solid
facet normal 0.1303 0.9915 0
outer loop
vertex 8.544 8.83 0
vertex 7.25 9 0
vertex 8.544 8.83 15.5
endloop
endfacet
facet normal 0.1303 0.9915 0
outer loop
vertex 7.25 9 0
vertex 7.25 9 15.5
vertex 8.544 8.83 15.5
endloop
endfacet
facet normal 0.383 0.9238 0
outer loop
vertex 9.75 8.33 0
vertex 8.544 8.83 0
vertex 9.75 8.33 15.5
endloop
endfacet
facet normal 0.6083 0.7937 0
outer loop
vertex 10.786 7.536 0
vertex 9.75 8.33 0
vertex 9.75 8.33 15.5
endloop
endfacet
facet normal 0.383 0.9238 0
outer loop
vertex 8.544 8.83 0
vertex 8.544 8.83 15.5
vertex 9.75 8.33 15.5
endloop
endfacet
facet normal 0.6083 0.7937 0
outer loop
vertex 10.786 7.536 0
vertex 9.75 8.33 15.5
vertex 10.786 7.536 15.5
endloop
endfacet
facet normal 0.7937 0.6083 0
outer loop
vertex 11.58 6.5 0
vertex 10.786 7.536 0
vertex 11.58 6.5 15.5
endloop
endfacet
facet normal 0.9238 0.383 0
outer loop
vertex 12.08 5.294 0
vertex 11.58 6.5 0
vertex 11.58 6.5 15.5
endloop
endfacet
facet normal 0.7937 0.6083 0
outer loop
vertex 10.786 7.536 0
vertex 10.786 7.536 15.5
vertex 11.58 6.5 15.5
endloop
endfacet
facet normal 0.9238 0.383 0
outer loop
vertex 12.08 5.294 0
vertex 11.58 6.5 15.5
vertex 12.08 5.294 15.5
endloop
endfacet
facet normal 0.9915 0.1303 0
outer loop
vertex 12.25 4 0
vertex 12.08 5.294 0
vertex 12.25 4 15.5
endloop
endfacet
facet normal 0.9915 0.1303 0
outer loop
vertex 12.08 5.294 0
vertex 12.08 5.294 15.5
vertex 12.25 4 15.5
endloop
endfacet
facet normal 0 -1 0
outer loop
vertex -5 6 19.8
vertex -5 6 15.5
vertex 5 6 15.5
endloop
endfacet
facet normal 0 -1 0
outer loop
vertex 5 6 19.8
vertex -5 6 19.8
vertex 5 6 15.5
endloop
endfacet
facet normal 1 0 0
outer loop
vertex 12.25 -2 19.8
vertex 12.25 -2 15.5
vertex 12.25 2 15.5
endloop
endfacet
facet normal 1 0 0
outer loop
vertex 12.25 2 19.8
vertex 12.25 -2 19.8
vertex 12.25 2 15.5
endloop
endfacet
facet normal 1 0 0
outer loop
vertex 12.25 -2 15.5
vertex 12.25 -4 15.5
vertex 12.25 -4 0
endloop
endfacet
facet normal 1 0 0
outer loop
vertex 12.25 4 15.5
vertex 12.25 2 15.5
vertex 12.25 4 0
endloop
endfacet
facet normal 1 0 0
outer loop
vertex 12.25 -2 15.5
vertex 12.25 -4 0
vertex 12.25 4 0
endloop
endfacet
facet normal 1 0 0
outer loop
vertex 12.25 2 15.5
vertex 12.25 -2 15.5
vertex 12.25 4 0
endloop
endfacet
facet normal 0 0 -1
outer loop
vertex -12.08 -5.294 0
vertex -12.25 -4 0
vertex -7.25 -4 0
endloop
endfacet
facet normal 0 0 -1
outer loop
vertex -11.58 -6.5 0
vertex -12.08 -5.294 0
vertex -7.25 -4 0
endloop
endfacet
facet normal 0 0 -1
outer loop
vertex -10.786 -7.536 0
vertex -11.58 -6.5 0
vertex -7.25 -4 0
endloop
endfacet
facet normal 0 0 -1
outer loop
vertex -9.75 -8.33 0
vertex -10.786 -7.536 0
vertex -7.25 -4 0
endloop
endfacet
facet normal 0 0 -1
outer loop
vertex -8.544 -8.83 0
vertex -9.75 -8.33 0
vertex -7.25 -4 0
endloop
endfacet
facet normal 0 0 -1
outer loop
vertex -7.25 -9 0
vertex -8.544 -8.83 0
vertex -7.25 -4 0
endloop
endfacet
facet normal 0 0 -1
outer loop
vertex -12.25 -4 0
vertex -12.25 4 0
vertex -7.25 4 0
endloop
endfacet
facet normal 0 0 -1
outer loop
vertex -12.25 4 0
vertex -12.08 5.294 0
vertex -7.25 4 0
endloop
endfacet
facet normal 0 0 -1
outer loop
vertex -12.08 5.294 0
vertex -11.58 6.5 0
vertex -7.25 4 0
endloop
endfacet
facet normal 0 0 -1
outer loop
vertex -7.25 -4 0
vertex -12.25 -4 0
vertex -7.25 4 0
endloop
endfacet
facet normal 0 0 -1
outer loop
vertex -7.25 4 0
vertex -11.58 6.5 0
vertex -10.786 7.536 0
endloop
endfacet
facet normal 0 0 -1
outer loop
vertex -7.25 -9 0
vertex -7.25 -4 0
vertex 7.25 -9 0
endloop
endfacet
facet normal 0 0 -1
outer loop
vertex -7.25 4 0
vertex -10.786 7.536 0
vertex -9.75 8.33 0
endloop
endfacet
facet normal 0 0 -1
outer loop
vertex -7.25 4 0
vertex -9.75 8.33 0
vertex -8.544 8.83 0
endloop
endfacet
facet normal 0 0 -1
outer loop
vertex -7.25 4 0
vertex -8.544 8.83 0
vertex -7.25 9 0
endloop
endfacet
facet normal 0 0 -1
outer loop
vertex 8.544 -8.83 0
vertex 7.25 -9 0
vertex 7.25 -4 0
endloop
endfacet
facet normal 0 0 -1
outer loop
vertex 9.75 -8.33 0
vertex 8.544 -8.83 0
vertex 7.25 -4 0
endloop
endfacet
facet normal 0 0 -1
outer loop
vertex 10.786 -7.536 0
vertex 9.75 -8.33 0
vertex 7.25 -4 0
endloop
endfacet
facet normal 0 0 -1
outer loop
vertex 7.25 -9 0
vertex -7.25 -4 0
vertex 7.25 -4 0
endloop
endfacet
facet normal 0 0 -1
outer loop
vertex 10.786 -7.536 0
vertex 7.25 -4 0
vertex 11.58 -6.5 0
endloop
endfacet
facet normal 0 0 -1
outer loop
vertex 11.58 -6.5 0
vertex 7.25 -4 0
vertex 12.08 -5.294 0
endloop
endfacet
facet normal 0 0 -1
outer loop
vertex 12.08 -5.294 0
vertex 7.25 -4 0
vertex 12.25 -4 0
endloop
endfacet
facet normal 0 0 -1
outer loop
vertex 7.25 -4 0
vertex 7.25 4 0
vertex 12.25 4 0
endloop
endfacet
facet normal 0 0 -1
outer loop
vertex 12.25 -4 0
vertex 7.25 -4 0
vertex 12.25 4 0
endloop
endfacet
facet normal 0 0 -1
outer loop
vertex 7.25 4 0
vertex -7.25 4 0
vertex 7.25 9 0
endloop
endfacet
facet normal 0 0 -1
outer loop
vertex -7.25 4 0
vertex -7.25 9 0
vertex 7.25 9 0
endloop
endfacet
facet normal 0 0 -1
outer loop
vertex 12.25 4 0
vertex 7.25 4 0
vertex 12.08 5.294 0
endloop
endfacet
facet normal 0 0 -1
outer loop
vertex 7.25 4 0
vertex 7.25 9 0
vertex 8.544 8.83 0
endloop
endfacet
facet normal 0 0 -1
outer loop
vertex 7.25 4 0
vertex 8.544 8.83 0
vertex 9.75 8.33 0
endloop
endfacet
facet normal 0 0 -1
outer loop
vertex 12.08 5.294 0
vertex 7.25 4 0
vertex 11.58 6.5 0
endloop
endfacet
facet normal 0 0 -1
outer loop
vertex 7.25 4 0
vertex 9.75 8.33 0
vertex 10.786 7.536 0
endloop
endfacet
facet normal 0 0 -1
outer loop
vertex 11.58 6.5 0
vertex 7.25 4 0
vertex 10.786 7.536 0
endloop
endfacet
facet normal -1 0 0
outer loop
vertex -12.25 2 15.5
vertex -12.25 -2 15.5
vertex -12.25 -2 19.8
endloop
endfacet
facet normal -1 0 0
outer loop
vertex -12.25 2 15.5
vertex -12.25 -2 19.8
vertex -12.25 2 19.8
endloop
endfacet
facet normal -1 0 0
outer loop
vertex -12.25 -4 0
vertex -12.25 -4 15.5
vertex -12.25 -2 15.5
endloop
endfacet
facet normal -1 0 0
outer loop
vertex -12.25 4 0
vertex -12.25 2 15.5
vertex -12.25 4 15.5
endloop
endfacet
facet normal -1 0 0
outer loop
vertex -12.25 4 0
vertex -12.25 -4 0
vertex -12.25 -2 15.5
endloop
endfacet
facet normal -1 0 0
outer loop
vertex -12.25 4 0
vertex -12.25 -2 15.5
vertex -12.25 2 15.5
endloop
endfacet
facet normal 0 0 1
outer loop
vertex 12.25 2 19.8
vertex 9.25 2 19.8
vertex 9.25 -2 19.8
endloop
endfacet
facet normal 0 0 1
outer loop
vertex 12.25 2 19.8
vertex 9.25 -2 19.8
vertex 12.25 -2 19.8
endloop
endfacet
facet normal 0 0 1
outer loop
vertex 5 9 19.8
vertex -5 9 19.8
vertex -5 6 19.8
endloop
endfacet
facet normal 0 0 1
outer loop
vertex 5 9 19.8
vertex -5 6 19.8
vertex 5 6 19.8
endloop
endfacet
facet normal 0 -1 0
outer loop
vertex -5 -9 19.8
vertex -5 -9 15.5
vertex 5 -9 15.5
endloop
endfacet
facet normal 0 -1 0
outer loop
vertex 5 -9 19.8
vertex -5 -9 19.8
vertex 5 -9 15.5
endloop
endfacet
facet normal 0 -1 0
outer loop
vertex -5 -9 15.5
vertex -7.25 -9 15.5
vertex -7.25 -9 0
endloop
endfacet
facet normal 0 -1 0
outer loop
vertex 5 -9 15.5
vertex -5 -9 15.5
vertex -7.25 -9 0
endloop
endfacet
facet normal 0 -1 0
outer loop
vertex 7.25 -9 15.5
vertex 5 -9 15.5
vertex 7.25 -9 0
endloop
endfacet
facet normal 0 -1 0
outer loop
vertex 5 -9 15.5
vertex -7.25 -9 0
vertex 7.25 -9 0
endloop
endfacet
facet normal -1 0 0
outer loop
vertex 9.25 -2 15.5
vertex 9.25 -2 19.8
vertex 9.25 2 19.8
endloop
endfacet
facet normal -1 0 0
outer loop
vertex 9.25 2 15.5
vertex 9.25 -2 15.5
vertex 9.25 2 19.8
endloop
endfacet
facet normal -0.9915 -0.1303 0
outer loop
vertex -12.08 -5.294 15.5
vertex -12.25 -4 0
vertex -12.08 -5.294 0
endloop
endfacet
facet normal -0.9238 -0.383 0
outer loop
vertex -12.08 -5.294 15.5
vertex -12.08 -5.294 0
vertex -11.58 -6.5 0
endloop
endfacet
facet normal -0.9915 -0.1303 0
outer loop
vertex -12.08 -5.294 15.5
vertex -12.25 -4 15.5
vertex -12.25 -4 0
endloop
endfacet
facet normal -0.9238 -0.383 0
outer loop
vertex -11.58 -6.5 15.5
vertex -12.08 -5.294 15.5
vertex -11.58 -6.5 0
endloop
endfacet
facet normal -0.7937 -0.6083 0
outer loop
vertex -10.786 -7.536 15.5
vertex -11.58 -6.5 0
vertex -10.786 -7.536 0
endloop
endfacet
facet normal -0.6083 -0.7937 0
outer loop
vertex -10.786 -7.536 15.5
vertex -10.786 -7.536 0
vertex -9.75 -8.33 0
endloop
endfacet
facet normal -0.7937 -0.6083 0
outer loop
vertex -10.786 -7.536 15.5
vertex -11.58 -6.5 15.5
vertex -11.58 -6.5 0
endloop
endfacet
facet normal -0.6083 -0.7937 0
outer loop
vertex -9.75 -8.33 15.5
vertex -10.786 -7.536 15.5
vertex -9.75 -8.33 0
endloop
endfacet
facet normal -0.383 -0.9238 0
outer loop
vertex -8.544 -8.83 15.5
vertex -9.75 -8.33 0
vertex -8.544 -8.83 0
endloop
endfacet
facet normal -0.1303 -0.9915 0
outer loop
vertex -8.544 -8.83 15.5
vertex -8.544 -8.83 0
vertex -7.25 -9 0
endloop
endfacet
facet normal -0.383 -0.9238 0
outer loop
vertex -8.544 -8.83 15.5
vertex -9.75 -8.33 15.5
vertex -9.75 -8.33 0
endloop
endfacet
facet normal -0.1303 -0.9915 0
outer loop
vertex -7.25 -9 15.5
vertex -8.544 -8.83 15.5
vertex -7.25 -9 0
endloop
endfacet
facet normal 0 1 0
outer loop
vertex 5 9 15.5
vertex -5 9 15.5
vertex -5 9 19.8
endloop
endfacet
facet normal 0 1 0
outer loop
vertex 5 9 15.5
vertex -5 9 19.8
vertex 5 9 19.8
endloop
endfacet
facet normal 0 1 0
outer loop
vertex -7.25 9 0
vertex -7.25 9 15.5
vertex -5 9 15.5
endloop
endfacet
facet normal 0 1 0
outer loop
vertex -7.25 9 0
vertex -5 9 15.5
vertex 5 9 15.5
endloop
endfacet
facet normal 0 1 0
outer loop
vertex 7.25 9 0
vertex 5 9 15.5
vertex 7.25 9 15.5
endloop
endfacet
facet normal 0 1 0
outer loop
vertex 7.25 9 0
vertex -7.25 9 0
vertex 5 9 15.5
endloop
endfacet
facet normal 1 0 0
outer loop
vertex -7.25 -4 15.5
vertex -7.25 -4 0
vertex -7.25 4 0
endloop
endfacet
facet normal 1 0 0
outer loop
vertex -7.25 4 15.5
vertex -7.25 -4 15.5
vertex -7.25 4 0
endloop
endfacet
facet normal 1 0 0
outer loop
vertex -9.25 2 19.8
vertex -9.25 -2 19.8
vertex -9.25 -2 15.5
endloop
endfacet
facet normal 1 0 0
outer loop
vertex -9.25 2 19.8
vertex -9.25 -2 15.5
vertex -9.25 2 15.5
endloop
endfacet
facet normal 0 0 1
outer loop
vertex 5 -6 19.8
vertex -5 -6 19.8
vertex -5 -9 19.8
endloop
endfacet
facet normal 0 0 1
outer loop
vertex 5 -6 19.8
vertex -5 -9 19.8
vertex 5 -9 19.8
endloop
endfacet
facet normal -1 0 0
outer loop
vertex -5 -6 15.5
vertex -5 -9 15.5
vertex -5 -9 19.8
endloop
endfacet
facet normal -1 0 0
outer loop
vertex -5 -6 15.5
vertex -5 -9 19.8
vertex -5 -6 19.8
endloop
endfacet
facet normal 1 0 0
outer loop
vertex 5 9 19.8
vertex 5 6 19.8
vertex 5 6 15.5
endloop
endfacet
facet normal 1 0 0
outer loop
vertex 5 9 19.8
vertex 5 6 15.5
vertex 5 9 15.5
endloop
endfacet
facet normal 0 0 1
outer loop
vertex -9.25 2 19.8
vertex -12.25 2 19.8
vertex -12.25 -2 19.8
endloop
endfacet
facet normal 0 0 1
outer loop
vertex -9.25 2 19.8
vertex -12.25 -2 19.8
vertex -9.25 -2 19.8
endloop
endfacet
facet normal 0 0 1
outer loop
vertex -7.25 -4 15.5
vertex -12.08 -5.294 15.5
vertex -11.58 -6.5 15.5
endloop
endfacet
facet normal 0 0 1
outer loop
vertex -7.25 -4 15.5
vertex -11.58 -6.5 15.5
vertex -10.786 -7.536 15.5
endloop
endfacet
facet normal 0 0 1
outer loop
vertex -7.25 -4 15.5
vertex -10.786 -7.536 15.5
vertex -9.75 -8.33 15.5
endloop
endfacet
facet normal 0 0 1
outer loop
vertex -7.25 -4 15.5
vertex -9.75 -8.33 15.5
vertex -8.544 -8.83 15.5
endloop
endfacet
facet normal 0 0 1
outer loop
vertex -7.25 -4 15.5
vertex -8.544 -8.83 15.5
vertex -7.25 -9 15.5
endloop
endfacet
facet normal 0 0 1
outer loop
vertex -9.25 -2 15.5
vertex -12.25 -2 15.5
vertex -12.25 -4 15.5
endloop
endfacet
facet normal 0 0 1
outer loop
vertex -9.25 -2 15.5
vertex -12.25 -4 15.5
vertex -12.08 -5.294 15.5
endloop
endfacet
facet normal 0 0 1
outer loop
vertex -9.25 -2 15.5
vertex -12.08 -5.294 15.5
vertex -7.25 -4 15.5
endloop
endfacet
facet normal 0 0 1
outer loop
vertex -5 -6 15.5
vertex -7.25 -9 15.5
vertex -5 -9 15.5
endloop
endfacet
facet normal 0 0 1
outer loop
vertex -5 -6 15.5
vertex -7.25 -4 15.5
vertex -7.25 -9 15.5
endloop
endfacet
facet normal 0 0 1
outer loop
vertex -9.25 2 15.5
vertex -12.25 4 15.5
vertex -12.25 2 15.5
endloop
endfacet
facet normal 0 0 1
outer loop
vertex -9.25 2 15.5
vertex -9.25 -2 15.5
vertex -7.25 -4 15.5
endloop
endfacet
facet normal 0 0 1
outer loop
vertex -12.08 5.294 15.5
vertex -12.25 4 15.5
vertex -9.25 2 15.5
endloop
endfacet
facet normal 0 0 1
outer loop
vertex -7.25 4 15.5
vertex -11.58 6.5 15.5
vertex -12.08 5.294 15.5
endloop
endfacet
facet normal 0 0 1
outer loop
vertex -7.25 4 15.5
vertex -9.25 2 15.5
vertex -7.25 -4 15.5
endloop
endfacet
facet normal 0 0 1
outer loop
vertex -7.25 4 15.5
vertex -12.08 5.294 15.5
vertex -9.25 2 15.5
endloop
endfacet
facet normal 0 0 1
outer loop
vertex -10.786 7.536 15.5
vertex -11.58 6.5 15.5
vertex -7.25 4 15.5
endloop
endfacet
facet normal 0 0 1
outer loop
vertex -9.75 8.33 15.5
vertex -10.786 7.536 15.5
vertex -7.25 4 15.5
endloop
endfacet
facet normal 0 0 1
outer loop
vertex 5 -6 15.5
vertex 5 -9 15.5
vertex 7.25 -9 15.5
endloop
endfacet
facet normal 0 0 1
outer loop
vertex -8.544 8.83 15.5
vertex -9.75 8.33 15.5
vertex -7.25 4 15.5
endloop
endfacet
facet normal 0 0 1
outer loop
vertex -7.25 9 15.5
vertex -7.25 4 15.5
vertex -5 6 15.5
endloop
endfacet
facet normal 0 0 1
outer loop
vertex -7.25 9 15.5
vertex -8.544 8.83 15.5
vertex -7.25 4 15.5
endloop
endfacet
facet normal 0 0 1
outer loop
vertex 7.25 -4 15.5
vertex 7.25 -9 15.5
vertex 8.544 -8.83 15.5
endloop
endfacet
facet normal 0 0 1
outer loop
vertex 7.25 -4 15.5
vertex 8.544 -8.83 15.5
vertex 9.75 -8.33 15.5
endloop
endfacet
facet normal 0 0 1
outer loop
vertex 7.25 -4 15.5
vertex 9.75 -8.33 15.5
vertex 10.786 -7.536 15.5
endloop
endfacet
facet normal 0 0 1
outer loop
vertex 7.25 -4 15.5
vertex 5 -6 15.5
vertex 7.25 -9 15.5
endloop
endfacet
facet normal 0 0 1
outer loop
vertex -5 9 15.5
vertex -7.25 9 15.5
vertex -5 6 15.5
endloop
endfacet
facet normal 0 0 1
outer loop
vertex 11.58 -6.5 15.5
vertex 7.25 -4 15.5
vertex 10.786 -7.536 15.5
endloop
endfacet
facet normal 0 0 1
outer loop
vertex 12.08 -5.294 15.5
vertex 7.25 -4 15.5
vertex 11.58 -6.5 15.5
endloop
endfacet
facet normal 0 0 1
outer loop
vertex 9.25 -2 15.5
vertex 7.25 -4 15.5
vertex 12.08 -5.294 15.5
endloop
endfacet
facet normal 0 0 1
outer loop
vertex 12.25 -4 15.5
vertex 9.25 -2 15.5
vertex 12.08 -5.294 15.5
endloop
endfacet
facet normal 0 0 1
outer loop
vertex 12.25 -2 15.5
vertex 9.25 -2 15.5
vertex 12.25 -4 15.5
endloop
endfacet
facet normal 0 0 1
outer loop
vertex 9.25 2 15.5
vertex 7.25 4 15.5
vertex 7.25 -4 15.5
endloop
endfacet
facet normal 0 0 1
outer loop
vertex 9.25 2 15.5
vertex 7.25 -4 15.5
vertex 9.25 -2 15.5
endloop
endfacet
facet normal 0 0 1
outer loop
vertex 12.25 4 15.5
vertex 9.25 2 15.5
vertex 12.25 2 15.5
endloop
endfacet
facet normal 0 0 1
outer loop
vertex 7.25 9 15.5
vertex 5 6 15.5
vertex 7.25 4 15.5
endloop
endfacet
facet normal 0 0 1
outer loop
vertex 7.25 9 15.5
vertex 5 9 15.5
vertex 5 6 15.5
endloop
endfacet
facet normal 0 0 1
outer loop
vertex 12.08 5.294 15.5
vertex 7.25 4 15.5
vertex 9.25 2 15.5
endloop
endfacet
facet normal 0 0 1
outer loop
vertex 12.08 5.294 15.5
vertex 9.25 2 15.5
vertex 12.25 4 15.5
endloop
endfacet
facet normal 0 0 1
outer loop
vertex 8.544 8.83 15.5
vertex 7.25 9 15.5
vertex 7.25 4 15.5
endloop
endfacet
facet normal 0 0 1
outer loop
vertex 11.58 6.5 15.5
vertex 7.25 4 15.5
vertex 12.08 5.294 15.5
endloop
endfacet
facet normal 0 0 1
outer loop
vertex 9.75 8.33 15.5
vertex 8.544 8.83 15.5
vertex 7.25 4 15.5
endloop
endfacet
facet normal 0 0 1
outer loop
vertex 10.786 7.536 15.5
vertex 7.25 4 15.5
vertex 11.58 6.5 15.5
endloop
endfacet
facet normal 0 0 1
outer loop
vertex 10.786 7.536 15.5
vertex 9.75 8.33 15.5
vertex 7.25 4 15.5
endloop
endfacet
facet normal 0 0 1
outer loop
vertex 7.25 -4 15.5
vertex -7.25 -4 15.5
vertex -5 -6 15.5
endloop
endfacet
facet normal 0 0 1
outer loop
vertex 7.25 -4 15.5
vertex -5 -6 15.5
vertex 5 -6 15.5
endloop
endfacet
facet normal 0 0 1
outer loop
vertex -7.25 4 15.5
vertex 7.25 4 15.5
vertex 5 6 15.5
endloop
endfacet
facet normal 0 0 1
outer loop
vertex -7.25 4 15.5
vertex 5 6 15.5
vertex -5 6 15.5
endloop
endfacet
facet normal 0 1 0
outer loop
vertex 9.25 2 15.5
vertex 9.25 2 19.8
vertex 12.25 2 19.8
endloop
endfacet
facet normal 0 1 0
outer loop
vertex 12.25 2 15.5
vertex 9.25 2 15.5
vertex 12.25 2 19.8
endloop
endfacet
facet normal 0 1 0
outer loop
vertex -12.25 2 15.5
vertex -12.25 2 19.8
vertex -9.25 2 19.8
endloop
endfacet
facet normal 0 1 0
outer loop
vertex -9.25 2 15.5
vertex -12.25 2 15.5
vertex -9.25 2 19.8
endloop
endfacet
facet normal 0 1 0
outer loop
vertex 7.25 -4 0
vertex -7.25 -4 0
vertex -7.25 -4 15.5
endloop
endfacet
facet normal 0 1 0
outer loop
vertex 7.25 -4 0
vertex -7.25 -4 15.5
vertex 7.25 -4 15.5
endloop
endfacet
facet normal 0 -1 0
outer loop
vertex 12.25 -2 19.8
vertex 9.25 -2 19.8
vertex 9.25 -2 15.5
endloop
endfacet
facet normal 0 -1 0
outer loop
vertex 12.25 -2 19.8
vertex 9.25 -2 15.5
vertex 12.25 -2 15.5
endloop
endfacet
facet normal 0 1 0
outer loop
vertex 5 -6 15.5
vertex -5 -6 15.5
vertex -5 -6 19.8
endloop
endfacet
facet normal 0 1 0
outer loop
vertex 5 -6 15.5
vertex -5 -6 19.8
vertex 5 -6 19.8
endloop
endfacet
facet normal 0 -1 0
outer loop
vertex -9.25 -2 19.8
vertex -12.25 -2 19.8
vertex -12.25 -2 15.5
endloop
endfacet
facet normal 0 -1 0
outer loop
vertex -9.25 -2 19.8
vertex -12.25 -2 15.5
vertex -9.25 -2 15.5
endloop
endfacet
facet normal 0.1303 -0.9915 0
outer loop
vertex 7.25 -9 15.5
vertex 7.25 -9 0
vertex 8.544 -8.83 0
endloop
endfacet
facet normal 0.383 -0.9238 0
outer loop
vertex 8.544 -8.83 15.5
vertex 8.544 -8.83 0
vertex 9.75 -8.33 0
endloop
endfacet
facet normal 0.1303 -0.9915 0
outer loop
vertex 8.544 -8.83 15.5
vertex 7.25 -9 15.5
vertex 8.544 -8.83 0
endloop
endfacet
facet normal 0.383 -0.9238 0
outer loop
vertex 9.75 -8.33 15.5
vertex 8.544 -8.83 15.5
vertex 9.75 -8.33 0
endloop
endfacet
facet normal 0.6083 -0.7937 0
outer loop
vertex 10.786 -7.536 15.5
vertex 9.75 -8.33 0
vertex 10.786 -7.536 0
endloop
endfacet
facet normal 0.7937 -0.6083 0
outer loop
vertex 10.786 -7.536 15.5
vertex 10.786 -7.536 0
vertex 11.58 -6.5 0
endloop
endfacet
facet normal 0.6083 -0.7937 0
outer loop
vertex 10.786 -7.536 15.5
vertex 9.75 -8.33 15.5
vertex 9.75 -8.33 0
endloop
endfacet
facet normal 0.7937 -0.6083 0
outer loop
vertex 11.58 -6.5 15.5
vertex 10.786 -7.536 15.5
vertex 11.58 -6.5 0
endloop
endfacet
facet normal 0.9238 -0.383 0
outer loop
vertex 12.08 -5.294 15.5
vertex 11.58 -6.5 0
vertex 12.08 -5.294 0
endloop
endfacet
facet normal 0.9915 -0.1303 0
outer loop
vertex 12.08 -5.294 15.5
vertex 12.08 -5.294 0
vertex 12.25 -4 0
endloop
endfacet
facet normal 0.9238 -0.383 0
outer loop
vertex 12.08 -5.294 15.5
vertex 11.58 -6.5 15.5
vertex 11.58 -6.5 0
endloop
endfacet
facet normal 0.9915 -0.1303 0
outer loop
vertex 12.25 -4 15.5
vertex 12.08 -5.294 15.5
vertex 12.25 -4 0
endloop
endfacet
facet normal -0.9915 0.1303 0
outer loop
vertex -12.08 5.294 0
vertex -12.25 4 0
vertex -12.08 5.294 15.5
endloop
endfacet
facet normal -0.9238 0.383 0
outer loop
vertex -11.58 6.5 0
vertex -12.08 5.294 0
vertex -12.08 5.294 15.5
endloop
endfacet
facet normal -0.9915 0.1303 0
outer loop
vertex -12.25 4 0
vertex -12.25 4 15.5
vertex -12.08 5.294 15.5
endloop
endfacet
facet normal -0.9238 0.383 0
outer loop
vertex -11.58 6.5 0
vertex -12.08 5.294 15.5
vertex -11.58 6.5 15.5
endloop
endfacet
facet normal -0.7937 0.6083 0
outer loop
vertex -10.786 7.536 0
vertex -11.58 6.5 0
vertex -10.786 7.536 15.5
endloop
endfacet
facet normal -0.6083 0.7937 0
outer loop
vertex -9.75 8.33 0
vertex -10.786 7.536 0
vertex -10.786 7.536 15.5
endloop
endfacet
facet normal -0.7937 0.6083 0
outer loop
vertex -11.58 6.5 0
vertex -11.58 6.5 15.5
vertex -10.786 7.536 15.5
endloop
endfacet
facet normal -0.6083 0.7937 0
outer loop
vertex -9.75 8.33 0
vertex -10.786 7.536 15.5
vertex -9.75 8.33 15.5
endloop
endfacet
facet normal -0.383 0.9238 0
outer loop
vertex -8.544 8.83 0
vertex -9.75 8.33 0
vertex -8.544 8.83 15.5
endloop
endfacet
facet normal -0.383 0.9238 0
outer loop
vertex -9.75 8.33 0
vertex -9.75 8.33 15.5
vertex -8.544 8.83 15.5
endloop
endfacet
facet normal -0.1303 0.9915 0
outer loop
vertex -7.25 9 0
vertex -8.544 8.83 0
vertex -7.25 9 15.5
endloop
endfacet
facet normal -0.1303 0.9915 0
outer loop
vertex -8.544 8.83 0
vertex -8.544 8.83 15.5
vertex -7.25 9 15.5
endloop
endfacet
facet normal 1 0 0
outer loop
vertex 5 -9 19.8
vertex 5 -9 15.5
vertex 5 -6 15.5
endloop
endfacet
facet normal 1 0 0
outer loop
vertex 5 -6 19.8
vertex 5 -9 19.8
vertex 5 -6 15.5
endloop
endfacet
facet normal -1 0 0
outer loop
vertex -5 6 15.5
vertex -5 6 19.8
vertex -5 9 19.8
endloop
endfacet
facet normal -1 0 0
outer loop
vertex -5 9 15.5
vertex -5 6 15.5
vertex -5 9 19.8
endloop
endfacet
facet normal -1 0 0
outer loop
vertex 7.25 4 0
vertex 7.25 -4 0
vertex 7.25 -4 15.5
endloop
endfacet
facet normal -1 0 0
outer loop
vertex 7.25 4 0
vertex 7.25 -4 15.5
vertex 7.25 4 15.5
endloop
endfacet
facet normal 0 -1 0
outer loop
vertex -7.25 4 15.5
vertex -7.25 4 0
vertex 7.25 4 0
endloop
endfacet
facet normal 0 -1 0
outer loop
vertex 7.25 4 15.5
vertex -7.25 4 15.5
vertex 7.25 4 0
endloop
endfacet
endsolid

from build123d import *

# Parameters (mm, degrees)
SKETCH1_W           = 24.5
SKETCH1_H           = 18
SKETCH1_W_2         = 14.5
SKETCH1_H_2         = 8
BOSS_EXTRUDE1_DEPTH = 15.5
FILLET1_R           = 5
SKETCH3_W           = 10
SKETCH3_H           = 3
SKETCH3_W_2         = 3
SKETCH3_H_2         = 4
BOSS_EXTRUDE2_DEPTH = 4.3


with BuildPart() as part:
    # Sketch1 → Boss-Extrude1 (new body)
    with BuildSketch(Plane.XY):
        Rectangle(SKETCH1_W, SKETCH1_H)
        Rectangle(SKETCH1_W_2, SKETCH1_H_2, mode=Mode.SUBTRACT)
    extrude(amount=BOSS_EXTRUDE1_DEPTH)

    # Fillet1
    fillet1_edges = [part.edges().sort_by_distance(p)[0] for p in [
        (-12.25, 9, 7.75),
        (12.25, 9, 7.75),
        (12.25, -9, 7.75),
        (-12.25, -9, 7.75),
    ]]
    fillet(fillet1_edges, radius=FILLET1_R)

    # Sketch3 → Boss-Extrude2 (add)
    with BuildSketch(Plane.XY.offset(15.5)):
        with Locations((0, -7.5)):
            Rectangle(SKETCH3_W, SKETCH3_H)
        with Locations((0, 7.5)):
            Rectangle(SKETCH3_W, SKETCH3_H)
        with Locations((-10.75, 0)):
            Rectangle(SKETCH3_W_2, SKETCH3_H_2)
        with Locations((10.75, 0)):
            Rectangle(SKETCH3_W_2, SKETCH3_H_2)
    extrude(amount=BOSS_EXTRUDE2_DEPTH)


solid = part.part
